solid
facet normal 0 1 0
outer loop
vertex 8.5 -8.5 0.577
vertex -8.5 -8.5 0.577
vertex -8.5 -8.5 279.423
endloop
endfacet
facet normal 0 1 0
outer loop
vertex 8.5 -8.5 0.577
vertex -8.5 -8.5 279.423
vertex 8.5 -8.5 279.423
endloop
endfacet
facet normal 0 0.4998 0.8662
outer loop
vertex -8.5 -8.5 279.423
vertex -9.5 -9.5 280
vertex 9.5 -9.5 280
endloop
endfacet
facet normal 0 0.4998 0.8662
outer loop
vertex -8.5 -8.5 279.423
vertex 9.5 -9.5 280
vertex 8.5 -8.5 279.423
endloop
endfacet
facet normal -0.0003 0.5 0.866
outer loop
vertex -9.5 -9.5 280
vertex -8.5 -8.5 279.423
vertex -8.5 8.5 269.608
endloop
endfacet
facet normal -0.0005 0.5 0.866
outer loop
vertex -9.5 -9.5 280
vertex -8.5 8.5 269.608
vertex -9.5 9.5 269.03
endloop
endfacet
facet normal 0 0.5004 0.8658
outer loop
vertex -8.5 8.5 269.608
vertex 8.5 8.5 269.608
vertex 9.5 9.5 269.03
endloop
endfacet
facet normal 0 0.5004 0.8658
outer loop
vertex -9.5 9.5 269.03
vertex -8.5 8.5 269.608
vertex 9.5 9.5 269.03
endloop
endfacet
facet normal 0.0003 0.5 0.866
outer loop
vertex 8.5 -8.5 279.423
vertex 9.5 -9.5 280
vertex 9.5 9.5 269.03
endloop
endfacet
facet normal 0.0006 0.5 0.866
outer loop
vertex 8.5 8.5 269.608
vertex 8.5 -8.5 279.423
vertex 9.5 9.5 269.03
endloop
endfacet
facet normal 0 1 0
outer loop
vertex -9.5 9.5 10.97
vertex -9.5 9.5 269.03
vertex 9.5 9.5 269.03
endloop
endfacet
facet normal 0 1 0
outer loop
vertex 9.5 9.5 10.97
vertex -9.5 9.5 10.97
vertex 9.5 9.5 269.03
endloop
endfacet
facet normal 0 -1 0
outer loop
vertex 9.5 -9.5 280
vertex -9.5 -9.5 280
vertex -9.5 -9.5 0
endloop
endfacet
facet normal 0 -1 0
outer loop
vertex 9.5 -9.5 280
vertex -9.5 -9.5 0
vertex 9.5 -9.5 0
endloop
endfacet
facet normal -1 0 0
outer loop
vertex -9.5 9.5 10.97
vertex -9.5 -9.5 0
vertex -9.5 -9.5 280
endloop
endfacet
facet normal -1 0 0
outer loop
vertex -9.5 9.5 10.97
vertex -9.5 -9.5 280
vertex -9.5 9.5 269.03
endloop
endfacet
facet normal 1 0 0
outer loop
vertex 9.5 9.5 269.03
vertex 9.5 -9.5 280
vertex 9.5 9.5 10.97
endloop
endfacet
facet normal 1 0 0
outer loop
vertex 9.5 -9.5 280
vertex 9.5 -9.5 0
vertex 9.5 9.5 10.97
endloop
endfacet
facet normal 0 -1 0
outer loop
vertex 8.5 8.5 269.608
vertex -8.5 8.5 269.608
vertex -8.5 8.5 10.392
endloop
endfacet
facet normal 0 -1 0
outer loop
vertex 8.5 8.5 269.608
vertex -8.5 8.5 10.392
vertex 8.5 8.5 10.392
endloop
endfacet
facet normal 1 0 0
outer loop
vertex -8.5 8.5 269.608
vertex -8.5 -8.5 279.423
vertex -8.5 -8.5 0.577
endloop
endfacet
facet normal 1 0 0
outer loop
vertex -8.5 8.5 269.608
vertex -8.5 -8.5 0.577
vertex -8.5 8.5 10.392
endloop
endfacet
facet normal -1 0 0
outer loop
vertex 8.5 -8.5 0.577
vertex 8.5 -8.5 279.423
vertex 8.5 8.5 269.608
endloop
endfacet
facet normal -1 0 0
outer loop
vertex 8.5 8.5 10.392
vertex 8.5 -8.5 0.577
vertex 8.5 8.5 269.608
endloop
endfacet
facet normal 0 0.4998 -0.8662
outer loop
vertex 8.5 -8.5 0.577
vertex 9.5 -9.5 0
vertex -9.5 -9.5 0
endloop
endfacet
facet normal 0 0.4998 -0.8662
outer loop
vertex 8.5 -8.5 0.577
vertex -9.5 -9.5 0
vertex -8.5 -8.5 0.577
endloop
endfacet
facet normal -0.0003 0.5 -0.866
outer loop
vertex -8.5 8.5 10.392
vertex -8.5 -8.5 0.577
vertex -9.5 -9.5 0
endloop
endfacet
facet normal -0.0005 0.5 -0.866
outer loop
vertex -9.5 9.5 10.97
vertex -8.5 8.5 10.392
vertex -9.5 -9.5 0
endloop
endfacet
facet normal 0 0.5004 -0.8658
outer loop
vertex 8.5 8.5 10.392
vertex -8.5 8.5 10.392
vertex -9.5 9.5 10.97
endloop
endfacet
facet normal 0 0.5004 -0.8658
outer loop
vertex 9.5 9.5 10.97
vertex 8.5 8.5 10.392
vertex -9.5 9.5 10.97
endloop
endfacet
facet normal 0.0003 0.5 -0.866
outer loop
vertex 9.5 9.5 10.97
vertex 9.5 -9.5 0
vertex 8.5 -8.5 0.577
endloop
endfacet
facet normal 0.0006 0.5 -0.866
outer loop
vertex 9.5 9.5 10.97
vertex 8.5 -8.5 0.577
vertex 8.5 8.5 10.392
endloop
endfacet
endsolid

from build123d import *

# Parameters (mm, degrees)
SKETCH1_W               = 19
SKETCH1_H               = 19
SKETCH1_W_2             = 17
SKETCH1_H_2             = 17
BOSS_EXTRUDE1_DEPTH     = 280
CUT_EXTRUDE3_DEPTH      = 1
CUT_EXTRUDE3_DEPTH_BACK = 20
CUT_EXTRUDE4_DEPTH      = 1
CUT_EXTRUDE4_DEPTH_BACK = 20


with BuildPart() as part:
    # Sketch1 → Boss-Extrude1 (new body)
    with BuildSketch(Plane.XY):
        Rectangle(SKETCH1_W, SKETCH1_H)
        Rectangle(SKETCH1_W_2, SKETCH1_H_2, mode=Mode.SUBTRACT)
    extrude(amount=BOSS_EXTRUDE1_DEPTH)

    # Sketch4 → Cut-Extrude3 (cut, two sides)
    with BuildSketch(Plane(origin=(9.5, 0, 0), x_dir=(0, 0, -1), z_dir=(1, 0, 0))) as cut_extrude3_sk:
        Polygon((-565.643902481, -504.24975197), (-280, -9.5), (-269.030344885, 9.5), (16.613557596, 504.24975197), (-972.885946344, 1075.537556933), (-1555.143406422, 67.038052993), align=None)
    extrude(amount=CUT_EXTRUDE3_DEPTH, mode=Mode.SUBTRACT)
    extrude(cut_extrude3_sk.sketch, amount=-CUT_EXTRUDE3_DEPTH_BACK, mode=Mode.SUBTRACT)

    # Sketch5 → Cut-Extrude4 (cut, two sides)
    with BuildSketch(Plane(origin=(9.5, 0, 0), x_dir=(0, 0, -1), z_dir=(1, 0, 0))) as cut_extrude4_sk:
        Polygon((285.643902481, -504.24975197), (0, -9.5), (-10.969655115, 9.5), (-296.613557596, 504.24975197), (692.885946344, 1075.537556933), (1275.143406422, 67.038052993), align=None)
    extrude(amount=CUT_EXTRUDE4_DEPTH, mode=Mode.SUBTRACT)
    extrude(cut_extrude4_sk.sketch, amount=-CUT_EXTRUDE4_DEPTH_BACK, mode=Mode.SUBTRACT)


solid = part.part
